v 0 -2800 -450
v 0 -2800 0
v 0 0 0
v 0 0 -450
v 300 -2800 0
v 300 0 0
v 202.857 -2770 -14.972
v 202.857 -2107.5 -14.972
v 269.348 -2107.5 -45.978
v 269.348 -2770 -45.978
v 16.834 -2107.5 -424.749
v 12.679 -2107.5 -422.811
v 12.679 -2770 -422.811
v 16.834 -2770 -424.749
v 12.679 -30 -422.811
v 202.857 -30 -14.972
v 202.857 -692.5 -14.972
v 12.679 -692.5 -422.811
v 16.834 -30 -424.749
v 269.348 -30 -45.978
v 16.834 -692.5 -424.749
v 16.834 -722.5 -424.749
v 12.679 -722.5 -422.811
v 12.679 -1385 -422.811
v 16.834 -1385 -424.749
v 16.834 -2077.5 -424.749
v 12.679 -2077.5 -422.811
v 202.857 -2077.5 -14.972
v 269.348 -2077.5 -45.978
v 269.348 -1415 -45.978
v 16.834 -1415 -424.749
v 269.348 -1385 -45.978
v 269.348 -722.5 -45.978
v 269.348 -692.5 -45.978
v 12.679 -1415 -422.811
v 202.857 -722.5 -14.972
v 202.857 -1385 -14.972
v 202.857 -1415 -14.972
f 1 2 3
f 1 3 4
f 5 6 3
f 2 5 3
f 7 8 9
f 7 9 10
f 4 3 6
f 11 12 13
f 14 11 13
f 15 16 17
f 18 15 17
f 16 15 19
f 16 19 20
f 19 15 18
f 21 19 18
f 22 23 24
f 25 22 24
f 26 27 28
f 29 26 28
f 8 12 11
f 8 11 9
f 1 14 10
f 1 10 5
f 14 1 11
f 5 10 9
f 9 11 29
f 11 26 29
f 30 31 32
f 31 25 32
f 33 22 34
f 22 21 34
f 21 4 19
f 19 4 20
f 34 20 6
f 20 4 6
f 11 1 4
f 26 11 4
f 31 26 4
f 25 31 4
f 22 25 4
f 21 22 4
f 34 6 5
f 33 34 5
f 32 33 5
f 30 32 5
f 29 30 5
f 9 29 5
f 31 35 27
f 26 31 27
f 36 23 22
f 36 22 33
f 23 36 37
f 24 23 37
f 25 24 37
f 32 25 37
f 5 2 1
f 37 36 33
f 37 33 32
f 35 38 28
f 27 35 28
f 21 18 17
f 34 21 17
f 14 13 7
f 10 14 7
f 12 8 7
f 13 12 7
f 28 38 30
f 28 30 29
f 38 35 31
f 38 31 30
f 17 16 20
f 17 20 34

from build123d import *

# Parameters (mm, degrees)
F1_DEPTH = 2800
F3_W     = 662.5
F3_H     = 450
F4_DEPTH = 247


with BuildPart() as f1:
    # F0 (on Front) → F1 (new body)
    with BuildSketch(Plane.XZ):
        Polygon((300, 0), (0, 0), (0, -450), align=None)
    extrude(amount=F1_DEPTH)

    # F3 (on face) → F4 (cut)
    with BuildSketch(Plane(origin=(172.36, 0, -80.372788), x_dir=(0, -1, 0), z_dir=(-0.906308, 0, 0.422618))):
        with Locations((2438.75, -152.838504)):
            Rectangle(F3_W, F3_H)
        with Locations((1746.25, -152.838504)):
            Rectangle(F3_W, F3_H)
        with Locations((1053.75, -152.838504)):
            Rectangle(F3_W, F3_H)
        with Locations((361.25, -152.838504)):
            Rectangle(F3_W, F3_H)
    extrude(amount=-F4_DEPTH, mode=Mode.SUBTRACT)


solid = f1.part
